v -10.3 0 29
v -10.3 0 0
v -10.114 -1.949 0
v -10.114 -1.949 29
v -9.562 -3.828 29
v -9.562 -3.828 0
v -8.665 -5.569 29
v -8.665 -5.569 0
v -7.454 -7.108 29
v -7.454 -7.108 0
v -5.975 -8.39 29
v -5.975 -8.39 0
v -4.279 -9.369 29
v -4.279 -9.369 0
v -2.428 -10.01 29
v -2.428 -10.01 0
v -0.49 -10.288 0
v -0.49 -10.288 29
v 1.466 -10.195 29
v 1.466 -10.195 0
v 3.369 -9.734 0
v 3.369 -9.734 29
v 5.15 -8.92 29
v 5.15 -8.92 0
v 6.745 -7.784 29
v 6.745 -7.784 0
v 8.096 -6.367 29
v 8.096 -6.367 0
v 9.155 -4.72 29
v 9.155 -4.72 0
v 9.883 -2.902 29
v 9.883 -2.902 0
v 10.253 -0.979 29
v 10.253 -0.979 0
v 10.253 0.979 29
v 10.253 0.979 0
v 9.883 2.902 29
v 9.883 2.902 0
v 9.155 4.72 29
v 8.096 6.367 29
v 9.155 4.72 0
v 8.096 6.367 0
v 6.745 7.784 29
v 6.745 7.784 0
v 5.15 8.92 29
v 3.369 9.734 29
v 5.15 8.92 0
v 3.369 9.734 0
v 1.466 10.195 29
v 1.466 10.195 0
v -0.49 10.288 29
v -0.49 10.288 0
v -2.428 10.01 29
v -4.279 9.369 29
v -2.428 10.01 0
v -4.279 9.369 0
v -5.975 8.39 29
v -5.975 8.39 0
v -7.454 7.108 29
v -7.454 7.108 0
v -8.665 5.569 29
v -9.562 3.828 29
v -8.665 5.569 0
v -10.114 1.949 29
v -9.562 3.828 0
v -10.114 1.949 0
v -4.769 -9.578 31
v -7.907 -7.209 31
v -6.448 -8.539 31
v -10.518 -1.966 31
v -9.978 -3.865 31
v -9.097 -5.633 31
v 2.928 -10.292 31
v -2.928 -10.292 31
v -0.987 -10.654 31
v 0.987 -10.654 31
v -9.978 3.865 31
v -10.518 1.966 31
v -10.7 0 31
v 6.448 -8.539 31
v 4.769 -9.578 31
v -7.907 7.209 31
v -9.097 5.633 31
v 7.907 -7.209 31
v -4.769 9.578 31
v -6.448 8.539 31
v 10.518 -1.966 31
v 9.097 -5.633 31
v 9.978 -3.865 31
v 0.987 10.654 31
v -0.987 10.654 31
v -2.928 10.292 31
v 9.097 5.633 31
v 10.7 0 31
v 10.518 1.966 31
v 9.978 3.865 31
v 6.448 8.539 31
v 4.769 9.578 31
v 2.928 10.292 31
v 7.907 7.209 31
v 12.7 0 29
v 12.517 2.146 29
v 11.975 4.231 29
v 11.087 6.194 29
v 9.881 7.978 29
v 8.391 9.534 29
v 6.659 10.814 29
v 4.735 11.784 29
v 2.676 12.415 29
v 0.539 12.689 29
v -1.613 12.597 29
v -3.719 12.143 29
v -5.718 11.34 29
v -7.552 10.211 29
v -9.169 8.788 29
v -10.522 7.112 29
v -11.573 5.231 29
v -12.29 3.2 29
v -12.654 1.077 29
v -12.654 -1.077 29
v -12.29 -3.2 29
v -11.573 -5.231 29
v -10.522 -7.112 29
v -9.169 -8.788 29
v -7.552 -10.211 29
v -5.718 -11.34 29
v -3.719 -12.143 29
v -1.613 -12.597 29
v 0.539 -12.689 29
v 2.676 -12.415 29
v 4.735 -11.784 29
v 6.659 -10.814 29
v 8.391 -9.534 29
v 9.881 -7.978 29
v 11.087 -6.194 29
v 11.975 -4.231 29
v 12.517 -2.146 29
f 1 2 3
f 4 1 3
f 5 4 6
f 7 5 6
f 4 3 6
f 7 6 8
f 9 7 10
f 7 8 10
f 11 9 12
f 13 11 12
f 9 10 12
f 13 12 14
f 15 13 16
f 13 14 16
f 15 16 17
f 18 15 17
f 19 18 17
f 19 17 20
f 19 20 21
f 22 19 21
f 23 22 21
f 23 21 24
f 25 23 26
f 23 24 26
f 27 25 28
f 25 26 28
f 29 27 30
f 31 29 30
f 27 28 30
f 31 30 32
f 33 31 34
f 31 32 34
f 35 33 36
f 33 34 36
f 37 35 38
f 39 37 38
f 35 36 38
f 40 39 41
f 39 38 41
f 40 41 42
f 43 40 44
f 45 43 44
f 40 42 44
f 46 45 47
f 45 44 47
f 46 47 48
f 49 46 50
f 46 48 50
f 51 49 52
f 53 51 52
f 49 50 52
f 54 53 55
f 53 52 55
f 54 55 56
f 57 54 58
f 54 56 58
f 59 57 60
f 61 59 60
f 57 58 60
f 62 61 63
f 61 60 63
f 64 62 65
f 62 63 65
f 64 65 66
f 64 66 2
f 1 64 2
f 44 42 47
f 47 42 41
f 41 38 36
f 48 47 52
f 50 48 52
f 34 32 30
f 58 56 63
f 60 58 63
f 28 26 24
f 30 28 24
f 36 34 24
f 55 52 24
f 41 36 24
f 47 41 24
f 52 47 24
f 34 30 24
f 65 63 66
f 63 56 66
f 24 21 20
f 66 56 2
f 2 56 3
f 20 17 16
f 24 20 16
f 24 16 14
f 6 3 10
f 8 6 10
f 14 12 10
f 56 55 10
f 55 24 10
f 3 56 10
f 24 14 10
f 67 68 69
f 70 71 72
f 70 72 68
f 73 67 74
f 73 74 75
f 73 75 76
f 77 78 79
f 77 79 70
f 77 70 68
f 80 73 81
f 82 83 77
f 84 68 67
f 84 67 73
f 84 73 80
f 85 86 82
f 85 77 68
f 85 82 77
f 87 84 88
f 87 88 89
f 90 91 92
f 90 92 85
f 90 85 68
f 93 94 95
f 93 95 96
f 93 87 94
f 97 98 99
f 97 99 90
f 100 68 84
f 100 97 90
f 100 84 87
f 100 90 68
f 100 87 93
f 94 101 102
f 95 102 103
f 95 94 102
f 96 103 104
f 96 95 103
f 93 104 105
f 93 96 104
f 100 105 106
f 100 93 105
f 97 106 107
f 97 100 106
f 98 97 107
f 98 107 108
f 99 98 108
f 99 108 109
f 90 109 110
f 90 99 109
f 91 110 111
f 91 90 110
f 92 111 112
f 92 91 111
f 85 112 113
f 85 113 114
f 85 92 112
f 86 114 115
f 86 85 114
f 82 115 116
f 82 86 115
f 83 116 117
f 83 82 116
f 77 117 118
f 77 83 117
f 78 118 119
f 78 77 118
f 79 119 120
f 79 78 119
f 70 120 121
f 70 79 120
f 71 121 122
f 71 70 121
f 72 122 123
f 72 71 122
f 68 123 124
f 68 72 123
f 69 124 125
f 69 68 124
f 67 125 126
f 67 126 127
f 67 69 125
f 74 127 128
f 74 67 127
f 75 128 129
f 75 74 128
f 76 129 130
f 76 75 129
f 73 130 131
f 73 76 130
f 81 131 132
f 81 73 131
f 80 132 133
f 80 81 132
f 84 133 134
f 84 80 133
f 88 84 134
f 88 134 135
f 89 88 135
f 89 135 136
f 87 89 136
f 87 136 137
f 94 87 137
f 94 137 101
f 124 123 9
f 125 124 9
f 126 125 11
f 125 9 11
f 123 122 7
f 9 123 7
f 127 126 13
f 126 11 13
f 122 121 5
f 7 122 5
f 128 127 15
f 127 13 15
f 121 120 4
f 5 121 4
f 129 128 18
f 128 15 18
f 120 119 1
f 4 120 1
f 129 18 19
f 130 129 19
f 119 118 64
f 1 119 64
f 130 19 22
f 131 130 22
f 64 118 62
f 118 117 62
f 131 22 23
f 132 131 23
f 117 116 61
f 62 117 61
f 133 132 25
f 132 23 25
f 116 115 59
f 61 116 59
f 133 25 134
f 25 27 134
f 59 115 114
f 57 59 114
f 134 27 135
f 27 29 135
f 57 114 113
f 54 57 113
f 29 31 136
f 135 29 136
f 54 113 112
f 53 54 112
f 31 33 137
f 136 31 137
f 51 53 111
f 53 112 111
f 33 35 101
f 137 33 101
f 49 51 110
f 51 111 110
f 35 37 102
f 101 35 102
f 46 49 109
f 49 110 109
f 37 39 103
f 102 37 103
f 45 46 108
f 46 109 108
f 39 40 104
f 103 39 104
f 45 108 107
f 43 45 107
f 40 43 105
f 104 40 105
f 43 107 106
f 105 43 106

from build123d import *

# Parameters (mm, degrees)
SKETCH2_R           = 10.3
BOSS_EXTRUDE1_DEPTH = 29
SKETCH3_R           = 12.7
BOSS_EXTRUDE2_DEPTH = 2
CHAMFER1_SIZE       = 2


with BuildPart() as part:
    # Sketch2 → Boss-Extrude1 (new body)
    with BuildSketch(Plane.XY):
        with Locations(Location((0, 0, 0), (0, 0, 180))):
            Circle(SKETCH2_R)
    extrude(amount=BOSS_EXTRUDE1_DEPTH)

    # Sketch3 → Boss-Extrude2 (add)
    with BuildSketch(Plane.XY.offset(29)):
        Circle(SKETCH3_R)
    extrude(amount=BOSS_EXTRUDE2_DEPTH)

    # Chamfer1
    chamfer1_edges = [part.edges().sort_by_distance(p)[0] for p in [
        (-12.7, 0, 31),
    ]]
    chamfer(chamfer1_edges, length=CHAMFER1_SIZE - 0.0001)  # a hair under: the kernel refuses the full size


solid = part.part
